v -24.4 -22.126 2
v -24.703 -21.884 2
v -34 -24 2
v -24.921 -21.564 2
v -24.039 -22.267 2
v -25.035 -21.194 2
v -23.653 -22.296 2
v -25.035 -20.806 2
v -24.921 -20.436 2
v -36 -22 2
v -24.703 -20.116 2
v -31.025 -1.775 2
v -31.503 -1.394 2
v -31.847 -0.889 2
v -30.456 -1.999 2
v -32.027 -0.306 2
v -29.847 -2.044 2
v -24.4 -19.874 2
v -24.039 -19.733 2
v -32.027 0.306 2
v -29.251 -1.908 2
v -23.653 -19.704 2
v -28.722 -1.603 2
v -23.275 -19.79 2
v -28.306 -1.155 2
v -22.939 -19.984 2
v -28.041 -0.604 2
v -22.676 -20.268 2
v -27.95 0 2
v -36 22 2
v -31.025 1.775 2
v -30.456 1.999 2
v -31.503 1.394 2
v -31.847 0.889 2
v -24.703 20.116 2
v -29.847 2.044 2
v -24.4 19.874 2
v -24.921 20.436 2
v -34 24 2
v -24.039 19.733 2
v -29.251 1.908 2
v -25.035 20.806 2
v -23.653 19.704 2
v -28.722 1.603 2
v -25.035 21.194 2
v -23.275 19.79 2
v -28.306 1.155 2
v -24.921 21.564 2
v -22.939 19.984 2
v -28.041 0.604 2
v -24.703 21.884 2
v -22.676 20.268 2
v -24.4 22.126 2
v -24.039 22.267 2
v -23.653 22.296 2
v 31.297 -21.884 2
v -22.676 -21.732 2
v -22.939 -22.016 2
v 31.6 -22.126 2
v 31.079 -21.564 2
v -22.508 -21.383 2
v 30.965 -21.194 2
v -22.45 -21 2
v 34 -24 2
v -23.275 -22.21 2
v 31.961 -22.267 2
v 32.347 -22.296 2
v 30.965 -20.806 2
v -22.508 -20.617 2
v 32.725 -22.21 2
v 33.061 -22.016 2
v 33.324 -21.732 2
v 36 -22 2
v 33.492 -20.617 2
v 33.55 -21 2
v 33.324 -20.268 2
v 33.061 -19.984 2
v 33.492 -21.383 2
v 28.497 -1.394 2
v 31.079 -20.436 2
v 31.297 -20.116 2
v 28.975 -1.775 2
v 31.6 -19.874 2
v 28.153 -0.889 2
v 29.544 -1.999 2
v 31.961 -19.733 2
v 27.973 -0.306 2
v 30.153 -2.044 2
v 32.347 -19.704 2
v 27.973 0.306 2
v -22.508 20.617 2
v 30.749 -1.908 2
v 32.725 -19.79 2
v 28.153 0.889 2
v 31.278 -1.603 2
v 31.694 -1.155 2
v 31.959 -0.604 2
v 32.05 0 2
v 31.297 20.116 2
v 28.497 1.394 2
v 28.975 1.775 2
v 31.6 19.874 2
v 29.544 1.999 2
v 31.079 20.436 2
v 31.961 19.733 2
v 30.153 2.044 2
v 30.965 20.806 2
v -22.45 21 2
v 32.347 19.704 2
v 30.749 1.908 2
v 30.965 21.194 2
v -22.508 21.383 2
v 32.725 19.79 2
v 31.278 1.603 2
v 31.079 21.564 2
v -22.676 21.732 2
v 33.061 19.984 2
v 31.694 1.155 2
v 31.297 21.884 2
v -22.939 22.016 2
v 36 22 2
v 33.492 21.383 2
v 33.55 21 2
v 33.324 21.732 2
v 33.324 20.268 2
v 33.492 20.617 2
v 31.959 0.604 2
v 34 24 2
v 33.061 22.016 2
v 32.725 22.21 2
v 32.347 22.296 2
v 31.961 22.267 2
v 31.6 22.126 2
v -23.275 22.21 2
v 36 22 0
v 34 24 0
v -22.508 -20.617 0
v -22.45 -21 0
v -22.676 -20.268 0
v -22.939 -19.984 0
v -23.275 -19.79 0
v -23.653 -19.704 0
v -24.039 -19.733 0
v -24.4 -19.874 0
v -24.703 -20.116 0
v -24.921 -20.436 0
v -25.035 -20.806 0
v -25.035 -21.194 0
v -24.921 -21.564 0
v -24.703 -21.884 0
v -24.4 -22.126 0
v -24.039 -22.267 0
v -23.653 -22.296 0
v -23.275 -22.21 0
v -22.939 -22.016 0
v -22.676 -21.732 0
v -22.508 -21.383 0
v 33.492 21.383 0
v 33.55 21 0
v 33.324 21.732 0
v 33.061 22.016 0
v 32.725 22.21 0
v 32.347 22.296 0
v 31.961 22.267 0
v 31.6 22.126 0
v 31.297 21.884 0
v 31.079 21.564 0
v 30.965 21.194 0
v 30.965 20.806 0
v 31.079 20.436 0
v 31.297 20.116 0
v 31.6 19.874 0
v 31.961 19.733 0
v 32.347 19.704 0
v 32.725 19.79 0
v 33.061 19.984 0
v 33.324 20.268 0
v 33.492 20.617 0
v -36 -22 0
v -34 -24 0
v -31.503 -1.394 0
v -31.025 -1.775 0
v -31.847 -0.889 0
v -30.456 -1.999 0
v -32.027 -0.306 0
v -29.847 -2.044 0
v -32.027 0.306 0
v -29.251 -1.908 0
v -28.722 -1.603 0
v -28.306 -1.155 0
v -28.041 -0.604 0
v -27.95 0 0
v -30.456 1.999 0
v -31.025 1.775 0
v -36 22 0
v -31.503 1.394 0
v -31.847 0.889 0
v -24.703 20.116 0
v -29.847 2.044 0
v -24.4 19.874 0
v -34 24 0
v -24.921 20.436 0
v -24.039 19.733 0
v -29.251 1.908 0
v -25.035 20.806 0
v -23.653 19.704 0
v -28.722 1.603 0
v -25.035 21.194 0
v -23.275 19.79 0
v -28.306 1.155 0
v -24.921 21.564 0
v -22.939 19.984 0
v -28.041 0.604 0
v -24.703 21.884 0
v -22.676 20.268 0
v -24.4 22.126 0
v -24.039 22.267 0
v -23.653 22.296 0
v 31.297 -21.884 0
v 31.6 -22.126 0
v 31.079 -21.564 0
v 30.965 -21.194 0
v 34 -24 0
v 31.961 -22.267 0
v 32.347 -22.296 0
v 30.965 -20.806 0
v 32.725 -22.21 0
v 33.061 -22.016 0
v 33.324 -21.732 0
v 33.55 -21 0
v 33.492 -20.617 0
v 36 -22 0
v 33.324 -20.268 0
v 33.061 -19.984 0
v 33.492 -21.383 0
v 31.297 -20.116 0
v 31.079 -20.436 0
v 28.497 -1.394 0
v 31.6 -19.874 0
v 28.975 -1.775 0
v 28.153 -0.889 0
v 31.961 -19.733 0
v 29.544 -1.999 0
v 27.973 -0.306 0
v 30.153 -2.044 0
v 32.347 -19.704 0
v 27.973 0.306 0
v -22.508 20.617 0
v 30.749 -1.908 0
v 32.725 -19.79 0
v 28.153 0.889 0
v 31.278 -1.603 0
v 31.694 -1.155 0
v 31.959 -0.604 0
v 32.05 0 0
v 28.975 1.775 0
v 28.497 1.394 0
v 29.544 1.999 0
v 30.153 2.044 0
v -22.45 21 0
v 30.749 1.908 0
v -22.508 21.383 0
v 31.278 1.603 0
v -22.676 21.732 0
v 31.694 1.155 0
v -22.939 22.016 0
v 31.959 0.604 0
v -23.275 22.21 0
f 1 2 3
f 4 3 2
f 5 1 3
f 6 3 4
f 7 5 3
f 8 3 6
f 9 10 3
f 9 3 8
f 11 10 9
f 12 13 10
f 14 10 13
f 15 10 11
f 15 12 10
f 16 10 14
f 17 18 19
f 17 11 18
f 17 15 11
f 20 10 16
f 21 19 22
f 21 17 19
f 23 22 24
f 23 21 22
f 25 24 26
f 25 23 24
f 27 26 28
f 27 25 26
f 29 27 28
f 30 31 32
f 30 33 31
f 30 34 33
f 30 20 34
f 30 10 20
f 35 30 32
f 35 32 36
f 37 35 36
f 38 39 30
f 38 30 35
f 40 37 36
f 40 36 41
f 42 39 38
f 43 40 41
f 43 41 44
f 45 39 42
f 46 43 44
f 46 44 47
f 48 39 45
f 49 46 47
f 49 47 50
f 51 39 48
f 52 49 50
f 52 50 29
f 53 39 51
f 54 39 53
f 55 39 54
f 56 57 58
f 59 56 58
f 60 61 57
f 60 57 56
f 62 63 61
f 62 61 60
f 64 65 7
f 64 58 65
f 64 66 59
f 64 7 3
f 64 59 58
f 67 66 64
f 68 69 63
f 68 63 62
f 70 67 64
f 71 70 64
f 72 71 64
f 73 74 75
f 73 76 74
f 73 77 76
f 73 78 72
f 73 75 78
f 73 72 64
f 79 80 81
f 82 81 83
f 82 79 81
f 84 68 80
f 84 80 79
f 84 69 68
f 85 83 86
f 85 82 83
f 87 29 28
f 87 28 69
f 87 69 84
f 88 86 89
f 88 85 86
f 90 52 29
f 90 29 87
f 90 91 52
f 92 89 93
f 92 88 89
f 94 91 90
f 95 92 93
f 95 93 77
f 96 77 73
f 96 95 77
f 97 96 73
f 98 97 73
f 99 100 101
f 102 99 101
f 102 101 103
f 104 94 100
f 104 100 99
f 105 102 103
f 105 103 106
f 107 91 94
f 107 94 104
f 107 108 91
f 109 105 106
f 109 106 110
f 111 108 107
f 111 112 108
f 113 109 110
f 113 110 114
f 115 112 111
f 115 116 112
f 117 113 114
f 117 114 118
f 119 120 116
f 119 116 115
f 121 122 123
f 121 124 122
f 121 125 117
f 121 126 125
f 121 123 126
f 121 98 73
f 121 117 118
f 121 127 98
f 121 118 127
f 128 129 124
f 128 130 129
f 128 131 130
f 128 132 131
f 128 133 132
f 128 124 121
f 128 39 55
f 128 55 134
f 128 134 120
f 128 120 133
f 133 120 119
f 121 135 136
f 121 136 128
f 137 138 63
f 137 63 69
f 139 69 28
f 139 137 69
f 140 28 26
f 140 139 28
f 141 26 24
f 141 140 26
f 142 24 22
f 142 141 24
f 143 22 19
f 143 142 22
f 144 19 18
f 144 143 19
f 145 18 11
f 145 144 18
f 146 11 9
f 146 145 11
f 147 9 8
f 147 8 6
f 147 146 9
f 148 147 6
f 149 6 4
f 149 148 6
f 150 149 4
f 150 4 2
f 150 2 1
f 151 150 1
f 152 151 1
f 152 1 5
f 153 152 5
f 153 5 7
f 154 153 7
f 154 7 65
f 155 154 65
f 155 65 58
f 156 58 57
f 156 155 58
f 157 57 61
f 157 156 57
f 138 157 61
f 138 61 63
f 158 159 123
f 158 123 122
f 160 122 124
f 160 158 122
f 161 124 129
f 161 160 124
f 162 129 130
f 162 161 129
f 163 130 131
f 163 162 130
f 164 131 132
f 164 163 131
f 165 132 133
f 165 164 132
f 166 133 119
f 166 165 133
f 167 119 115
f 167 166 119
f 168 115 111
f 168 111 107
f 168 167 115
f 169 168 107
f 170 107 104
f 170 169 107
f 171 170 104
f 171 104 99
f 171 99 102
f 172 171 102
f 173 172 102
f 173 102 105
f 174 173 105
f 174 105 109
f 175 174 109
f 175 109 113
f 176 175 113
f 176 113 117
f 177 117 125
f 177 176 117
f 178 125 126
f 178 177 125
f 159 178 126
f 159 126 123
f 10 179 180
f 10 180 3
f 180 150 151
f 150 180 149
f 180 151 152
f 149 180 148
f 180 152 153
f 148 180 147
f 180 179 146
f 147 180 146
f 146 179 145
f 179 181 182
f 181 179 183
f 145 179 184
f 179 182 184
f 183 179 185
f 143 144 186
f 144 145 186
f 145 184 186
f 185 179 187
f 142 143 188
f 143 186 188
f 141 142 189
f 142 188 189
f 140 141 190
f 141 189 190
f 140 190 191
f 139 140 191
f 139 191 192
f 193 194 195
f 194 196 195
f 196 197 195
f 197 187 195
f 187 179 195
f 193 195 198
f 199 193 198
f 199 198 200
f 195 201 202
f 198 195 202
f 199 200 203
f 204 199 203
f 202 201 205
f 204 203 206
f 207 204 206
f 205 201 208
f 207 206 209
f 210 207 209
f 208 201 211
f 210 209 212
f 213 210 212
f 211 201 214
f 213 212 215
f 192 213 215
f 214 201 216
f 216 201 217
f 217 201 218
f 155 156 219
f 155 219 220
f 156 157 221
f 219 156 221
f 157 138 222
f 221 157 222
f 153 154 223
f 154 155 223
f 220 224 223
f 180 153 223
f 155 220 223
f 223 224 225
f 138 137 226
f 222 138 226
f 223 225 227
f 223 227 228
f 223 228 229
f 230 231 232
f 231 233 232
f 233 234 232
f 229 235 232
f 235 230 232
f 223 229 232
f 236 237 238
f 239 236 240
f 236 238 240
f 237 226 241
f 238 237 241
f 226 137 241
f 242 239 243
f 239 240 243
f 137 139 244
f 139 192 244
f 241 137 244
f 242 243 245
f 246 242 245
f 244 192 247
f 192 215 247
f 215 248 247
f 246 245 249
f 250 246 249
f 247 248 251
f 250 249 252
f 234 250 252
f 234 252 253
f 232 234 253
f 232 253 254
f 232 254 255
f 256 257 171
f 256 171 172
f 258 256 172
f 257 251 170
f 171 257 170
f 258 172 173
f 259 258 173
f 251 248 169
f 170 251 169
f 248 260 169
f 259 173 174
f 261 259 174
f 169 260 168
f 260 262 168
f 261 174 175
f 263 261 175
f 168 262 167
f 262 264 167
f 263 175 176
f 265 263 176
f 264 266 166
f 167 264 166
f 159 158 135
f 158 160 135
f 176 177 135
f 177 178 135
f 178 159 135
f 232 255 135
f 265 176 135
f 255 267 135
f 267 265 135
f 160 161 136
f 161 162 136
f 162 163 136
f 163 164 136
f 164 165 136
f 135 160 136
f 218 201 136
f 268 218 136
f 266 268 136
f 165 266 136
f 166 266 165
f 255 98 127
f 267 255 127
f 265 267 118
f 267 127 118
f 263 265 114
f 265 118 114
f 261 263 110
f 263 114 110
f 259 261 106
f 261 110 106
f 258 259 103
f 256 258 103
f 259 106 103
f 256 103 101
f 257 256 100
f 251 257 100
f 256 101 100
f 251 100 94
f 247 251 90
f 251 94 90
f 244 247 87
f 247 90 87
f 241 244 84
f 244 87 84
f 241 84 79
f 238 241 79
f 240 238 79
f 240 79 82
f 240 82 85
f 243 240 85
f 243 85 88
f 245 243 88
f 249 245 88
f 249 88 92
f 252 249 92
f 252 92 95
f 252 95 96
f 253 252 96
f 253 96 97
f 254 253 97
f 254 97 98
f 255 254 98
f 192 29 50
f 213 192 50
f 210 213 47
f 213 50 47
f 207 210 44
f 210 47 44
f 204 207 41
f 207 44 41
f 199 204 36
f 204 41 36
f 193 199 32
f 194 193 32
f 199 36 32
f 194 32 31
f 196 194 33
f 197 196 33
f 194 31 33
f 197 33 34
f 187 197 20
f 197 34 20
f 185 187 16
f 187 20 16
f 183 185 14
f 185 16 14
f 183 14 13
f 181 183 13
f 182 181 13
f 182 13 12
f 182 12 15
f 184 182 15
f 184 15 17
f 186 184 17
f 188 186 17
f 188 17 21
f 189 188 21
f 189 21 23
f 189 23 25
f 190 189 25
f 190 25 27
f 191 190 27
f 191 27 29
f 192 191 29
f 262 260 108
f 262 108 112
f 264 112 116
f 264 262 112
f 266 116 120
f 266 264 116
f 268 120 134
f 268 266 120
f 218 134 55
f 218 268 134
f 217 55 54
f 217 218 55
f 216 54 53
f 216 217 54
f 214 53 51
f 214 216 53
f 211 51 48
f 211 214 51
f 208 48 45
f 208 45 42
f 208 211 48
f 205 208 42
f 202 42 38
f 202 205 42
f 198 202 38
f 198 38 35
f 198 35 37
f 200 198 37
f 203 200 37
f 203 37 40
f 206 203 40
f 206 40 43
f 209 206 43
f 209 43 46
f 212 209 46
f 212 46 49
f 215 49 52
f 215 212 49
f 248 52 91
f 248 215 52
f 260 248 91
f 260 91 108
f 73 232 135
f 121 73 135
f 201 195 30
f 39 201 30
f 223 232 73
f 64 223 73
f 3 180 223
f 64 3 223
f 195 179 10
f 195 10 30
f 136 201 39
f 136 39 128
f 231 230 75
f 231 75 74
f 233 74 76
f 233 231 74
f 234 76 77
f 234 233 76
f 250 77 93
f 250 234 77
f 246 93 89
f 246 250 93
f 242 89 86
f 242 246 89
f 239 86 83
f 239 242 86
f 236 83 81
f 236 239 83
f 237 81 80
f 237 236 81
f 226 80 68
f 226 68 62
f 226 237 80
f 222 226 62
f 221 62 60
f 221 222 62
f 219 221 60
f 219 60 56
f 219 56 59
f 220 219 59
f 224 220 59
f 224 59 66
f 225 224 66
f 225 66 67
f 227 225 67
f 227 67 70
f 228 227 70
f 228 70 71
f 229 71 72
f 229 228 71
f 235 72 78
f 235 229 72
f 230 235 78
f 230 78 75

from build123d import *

# Parameters (mm, degrees)
F0_W     = 72
F0_H     = 48
F0_R     = 1.3
F1_DEPTH = 2
F2_SIZE  = 2
F3_R     = 2.05
F4_DEPTH = 25


with BuildPart() as f1:
    # F0 (on Top) → F1 (new body)
    with BuildSketch(Plane.XY):
        Rectangle(F0_W, F0_H)
        with Locations((-23.75, -21)):
            Circle(F0_R, mode=Mode.SUBTRACT)
        with Locations((32.25, -21)):
            Circle(F0_R, mode=Mode.SUBTRACT)
        with Locations((-23.75, 21)):
            Circle(F0_R, mode=Mode.SUBTRACT)
        with Locations((32.25, 21)):
            Circle(F0_R, mode=Mode.SUBTRACT)
    extrude(amount=F1_DEPTH)

    # F2
    f2_edges = [f1.edges().sort_by_distance(p)[0] for p in [
        (-36, -24, 1),
        (36, -24, 1),
        (36, 24, 1),
        (-36, 24, 1),
    ]]
    chamfer(f2_edges, length=F2_SIZE)

    # F3 (on face) → F4 (cut)
    with BuildSketch(Plane.XY.offset(2)):
        with Locations((-30, 0)):
            Circle(F3_R)
        with Locations((30, 0)):
            Circle(F3_R)
    extrude(amount=-F4_DEPTH, mode=Mode.SUBTRACT)


solid = f1.part
